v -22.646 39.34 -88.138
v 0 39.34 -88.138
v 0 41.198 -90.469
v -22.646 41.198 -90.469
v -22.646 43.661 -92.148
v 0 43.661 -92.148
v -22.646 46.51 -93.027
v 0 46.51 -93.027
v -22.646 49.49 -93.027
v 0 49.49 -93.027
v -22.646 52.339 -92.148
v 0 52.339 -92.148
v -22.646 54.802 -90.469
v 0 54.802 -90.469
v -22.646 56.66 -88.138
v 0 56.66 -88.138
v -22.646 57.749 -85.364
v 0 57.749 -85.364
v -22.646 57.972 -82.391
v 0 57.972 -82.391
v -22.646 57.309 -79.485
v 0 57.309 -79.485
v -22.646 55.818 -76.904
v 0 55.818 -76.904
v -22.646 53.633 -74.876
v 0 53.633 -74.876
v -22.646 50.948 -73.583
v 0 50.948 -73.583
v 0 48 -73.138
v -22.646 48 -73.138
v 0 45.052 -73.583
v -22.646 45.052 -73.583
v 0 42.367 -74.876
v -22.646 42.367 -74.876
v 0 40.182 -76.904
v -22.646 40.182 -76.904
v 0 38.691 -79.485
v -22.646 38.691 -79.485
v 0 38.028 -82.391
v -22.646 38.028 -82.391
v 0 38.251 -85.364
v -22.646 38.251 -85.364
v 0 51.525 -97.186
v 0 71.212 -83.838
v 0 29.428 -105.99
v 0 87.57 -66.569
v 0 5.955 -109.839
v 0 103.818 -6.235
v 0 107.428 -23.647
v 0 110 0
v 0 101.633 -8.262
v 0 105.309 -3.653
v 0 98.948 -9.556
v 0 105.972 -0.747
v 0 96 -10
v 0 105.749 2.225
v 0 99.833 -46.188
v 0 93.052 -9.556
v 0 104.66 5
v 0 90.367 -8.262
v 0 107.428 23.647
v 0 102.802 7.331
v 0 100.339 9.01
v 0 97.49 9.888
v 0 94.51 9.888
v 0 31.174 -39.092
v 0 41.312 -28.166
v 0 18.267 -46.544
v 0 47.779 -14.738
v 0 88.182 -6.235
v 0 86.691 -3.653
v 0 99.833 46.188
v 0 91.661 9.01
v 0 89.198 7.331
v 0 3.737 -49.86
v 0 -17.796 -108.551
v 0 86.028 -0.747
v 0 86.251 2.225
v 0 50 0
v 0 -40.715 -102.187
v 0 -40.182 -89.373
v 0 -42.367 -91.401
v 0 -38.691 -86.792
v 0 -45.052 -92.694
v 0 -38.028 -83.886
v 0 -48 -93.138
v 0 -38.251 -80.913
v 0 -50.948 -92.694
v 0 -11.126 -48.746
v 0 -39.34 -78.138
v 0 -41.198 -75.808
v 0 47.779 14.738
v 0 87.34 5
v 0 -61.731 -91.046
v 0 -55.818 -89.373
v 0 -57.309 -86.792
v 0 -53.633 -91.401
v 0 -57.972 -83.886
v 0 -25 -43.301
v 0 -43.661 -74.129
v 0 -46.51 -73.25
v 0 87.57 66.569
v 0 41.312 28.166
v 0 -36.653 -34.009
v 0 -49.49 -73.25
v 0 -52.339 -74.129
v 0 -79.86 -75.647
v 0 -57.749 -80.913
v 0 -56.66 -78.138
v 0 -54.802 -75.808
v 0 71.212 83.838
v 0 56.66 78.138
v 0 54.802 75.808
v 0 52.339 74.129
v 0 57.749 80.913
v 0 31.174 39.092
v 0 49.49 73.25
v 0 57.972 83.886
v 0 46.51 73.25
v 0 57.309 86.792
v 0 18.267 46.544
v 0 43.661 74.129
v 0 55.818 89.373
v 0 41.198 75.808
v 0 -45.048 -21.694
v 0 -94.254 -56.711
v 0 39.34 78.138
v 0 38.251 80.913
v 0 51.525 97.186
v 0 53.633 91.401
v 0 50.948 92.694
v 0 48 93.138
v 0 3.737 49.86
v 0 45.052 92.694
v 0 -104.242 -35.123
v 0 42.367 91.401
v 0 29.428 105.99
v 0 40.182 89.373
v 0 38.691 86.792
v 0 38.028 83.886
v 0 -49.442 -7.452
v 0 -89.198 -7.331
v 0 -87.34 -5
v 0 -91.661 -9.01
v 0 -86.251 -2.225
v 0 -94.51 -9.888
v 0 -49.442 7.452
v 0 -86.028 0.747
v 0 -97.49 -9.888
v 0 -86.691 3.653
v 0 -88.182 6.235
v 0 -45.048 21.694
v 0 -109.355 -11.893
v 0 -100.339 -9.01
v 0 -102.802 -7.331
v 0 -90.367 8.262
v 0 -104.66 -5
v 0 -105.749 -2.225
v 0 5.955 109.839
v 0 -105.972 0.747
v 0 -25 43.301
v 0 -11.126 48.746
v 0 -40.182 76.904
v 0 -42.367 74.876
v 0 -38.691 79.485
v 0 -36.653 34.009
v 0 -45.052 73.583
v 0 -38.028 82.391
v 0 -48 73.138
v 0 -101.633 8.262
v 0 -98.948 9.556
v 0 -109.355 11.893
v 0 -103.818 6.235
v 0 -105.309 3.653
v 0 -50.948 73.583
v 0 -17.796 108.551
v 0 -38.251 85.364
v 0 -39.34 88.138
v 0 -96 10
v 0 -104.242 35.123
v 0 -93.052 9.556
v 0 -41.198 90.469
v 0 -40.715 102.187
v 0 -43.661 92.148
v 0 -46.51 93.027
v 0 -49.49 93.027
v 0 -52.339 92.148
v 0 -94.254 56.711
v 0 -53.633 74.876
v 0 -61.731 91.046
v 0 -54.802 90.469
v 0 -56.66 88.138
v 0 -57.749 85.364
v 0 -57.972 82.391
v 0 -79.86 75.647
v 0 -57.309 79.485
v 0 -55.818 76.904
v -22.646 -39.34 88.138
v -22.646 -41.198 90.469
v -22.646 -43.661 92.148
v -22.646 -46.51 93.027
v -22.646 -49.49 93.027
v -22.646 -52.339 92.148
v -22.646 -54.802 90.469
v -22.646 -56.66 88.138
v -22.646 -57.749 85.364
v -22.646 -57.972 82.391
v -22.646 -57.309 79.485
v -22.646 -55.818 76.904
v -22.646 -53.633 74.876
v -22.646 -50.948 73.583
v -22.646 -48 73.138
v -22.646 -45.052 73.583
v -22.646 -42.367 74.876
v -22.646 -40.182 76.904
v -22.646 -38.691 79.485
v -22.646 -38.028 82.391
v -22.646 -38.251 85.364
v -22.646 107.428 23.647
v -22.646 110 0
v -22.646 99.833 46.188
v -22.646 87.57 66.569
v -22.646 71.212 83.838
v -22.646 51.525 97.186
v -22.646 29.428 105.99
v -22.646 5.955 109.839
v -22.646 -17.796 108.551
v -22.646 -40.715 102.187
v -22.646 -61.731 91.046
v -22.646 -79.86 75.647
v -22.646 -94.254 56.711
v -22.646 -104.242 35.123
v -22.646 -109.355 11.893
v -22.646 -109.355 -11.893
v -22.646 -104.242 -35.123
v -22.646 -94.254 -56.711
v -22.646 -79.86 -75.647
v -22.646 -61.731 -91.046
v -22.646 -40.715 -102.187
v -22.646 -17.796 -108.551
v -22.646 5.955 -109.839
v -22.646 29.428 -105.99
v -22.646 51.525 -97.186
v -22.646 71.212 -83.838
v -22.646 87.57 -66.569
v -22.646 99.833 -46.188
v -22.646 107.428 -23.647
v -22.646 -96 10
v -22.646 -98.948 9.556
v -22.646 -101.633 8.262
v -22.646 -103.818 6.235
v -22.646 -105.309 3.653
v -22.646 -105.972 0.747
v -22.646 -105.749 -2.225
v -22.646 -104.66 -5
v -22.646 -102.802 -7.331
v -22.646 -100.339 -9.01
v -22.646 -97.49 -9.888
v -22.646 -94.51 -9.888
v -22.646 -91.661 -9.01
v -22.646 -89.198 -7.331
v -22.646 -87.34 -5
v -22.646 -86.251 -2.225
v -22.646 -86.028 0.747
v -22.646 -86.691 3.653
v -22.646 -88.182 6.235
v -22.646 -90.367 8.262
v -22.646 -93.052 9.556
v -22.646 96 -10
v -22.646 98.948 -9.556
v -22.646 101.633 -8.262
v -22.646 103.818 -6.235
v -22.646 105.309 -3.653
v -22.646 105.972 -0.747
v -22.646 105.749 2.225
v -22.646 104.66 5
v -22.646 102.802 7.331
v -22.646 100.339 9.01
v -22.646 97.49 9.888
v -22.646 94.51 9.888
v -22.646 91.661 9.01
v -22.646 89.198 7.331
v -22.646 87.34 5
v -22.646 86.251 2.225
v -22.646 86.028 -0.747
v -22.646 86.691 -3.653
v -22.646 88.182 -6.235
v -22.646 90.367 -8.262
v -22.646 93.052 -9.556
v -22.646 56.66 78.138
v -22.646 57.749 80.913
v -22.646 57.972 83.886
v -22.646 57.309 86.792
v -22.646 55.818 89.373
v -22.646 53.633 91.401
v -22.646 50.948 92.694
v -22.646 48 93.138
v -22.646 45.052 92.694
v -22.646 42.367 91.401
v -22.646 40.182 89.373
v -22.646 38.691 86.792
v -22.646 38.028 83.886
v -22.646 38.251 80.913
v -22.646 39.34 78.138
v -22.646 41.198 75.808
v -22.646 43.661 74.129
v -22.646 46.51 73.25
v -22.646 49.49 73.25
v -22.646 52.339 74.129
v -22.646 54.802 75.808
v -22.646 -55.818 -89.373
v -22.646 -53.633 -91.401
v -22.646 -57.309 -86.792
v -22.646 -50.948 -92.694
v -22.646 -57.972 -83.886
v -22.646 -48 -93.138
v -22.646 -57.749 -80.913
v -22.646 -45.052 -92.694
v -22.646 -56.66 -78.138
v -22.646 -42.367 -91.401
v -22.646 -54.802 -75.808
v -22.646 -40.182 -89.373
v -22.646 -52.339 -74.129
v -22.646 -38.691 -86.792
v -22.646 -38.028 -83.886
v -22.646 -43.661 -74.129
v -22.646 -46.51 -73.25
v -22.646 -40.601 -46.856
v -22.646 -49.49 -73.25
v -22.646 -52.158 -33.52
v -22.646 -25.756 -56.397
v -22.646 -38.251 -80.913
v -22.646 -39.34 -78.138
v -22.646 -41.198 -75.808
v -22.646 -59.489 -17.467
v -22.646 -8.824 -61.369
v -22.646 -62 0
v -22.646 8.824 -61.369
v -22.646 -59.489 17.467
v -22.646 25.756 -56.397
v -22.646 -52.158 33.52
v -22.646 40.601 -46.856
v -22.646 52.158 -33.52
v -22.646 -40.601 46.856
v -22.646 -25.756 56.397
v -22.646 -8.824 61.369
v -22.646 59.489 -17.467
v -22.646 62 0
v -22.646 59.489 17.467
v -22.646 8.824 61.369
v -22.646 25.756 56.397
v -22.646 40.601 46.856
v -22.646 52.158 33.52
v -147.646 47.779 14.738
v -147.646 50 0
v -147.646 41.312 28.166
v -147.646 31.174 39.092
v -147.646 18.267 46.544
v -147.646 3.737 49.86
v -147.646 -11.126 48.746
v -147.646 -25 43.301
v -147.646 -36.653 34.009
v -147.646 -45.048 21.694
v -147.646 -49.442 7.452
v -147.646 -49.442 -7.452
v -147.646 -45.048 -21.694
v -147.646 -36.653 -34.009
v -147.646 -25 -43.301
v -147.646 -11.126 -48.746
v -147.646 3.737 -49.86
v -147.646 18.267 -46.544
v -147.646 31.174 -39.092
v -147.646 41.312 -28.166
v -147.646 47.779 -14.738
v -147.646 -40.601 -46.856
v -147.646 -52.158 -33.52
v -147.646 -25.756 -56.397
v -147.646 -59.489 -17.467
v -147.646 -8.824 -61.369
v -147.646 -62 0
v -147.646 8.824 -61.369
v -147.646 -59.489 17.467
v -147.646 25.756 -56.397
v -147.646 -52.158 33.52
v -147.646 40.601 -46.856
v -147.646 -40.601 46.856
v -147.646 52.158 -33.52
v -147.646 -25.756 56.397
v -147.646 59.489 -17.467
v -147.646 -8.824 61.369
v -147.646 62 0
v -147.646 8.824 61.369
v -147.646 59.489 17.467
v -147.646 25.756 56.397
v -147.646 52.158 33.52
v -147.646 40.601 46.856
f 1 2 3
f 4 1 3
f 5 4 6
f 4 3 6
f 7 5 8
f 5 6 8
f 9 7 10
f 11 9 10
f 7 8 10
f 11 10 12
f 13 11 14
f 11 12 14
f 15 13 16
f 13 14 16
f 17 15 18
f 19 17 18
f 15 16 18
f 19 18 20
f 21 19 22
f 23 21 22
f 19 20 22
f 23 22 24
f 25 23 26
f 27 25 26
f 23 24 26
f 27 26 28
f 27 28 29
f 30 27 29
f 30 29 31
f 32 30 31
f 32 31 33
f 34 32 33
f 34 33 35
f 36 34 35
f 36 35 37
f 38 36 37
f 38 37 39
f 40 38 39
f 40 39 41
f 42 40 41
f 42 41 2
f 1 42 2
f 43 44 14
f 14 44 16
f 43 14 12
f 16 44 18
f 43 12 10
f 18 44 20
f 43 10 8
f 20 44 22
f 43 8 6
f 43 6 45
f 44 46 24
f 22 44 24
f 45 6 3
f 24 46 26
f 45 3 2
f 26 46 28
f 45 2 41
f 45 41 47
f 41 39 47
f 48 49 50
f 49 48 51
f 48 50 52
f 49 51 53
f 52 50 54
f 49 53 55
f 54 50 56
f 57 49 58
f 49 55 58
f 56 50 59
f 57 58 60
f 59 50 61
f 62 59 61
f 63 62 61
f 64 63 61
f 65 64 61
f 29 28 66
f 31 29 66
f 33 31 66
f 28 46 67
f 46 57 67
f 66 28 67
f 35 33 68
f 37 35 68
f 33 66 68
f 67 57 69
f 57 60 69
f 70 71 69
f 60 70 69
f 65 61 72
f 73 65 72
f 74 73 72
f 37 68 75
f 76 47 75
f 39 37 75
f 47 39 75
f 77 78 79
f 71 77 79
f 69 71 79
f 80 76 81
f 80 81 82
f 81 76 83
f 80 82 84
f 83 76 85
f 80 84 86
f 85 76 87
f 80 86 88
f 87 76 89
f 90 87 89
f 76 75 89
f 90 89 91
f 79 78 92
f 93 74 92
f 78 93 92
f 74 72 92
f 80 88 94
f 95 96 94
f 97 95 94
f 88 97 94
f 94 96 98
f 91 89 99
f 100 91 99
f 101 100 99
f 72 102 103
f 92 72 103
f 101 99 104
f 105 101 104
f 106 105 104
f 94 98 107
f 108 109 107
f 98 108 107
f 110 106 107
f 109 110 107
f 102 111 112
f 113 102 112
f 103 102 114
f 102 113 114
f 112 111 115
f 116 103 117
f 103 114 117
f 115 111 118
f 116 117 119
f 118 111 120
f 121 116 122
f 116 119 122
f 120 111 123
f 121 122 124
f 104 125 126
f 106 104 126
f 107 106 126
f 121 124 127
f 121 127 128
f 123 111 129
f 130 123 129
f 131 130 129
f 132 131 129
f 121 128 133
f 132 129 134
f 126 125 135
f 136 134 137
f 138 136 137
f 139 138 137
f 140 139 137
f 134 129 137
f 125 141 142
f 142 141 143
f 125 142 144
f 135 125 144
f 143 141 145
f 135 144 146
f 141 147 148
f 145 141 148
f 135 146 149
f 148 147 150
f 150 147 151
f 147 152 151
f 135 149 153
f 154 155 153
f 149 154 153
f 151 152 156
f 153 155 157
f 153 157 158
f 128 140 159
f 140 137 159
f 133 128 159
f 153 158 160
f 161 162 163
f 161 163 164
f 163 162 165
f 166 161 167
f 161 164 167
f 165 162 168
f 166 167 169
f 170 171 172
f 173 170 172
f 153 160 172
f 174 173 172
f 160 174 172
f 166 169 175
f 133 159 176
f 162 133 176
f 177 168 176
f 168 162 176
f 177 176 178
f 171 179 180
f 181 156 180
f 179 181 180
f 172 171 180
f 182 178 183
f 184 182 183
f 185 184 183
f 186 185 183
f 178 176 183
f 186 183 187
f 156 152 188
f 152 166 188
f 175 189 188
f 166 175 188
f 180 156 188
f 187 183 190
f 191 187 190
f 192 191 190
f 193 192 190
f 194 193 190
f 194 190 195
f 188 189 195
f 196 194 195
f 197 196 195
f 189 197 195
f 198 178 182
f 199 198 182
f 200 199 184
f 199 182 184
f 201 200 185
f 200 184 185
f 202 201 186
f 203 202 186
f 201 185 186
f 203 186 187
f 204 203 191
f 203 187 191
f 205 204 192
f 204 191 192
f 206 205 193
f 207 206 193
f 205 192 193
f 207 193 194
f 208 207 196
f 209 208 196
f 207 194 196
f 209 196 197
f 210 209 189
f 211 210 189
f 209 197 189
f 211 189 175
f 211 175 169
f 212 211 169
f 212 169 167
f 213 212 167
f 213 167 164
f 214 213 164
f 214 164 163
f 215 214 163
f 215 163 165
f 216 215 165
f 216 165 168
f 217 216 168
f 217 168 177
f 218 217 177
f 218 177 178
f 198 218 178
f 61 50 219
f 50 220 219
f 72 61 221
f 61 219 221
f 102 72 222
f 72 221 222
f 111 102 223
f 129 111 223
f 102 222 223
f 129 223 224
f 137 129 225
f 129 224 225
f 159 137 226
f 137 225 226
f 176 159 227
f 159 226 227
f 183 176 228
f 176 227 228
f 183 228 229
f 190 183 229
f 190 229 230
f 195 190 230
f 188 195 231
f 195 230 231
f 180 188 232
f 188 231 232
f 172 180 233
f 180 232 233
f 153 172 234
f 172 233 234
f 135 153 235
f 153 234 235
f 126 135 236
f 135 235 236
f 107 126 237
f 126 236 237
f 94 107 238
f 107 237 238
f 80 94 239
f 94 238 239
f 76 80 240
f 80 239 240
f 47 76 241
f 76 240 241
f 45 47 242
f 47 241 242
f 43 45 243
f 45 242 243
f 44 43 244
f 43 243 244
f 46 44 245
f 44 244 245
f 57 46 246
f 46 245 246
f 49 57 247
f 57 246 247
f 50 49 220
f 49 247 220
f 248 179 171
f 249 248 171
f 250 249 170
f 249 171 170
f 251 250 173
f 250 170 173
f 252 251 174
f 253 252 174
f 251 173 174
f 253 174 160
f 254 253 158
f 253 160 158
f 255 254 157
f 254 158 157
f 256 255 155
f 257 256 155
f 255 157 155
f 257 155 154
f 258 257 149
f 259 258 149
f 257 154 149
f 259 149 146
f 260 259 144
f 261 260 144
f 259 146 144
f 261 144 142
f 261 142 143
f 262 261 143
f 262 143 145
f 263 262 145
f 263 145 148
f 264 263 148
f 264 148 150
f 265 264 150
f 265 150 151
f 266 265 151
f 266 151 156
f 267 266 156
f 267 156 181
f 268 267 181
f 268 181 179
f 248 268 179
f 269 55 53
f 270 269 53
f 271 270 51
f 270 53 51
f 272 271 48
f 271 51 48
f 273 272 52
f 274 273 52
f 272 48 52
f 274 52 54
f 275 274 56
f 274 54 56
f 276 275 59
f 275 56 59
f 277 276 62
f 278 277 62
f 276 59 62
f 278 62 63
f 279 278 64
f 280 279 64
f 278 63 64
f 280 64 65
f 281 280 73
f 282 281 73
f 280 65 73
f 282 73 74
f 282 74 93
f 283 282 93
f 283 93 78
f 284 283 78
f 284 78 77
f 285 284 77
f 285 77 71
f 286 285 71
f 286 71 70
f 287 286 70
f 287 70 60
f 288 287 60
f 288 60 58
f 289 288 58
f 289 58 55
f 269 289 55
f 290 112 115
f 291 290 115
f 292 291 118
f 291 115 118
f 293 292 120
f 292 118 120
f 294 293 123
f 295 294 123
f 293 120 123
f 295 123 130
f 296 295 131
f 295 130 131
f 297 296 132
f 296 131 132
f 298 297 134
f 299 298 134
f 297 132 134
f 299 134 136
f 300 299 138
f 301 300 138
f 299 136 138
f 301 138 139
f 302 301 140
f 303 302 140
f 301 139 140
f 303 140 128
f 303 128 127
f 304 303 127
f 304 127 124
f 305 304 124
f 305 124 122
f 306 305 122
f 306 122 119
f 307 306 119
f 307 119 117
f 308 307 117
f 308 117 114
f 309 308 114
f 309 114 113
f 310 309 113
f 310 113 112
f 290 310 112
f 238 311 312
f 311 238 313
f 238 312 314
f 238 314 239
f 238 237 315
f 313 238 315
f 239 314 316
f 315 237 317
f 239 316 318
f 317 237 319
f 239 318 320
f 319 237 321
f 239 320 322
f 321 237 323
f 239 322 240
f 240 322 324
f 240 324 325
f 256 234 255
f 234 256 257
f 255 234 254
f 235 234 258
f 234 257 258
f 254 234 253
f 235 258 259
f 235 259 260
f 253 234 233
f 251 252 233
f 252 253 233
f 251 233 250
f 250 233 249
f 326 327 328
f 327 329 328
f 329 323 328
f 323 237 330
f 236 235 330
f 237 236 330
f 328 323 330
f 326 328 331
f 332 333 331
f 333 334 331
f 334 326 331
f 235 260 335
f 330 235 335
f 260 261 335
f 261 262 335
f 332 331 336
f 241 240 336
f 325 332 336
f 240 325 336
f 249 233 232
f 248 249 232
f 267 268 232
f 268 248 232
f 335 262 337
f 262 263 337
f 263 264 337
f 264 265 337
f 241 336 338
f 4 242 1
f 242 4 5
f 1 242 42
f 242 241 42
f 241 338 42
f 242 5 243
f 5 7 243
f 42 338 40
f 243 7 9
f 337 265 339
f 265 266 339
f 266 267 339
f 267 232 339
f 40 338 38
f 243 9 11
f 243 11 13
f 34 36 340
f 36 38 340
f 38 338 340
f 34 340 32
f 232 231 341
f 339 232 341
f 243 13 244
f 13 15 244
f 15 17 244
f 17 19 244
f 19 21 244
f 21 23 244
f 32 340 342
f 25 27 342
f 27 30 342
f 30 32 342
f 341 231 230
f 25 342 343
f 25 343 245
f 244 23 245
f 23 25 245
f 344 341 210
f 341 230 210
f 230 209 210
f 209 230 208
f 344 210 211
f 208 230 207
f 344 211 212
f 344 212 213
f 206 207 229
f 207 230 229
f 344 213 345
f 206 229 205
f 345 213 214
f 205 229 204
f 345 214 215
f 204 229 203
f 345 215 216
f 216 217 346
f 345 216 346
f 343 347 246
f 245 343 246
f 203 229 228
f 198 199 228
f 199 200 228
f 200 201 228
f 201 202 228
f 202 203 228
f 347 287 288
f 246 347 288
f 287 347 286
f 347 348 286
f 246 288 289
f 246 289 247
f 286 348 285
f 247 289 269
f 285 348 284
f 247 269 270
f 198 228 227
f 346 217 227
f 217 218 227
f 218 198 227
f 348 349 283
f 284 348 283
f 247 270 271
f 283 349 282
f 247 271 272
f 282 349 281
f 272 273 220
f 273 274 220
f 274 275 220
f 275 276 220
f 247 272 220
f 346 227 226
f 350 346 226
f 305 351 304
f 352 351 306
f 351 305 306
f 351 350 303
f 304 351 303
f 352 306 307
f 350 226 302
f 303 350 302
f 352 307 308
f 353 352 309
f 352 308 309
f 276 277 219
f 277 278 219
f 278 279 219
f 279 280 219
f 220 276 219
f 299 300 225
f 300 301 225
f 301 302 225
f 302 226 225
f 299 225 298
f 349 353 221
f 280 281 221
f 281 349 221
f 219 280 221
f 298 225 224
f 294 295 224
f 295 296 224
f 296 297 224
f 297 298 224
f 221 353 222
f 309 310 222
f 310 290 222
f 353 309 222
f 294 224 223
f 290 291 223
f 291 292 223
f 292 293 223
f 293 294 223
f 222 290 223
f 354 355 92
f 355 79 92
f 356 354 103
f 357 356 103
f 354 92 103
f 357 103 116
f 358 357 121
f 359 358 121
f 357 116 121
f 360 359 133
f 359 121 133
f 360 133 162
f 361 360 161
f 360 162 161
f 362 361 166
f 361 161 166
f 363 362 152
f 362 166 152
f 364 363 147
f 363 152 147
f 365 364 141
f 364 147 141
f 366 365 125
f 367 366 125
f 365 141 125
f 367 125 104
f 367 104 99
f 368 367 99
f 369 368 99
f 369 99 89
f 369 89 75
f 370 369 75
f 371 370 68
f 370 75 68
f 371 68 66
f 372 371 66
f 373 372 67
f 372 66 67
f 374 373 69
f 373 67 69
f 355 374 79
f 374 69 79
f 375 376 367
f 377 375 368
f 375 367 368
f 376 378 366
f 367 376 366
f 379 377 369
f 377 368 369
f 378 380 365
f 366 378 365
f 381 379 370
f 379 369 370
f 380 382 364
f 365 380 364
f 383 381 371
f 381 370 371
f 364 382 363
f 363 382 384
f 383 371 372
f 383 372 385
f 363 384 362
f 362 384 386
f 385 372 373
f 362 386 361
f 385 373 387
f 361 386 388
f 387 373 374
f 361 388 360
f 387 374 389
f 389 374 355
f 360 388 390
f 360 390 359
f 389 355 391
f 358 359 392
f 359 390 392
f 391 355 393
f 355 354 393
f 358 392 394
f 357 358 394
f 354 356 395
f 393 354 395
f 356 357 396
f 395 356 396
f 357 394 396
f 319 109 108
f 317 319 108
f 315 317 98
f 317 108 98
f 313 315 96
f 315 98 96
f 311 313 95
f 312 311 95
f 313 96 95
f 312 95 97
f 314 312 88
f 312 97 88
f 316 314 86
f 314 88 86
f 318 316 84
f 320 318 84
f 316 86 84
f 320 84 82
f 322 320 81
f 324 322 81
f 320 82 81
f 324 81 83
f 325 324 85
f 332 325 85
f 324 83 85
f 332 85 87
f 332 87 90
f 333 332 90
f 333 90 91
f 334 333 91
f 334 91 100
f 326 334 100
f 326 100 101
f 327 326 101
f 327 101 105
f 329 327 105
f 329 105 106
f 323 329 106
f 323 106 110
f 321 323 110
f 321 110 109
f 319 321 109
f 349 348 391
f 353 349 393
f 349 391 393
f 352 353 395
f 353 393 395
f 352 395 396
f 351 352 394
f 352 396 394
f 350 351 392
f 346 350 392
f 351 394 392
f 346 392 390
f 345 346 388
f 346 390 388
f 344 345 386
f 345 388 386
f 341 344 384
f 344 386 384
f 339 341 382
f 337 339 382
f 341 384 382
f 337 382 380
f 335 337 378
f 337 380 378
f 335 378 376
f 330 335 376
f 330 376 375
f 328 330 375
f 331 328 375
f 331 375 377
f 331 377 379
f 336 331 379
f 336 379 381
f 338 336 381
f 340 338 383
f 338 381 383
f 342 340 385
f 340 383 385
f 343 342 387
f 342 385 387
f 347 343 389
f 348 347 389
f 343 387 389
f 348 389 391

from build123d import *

# Parameters (mm, degrees)
SKETCH2_R          = 10
CUT_EXTRUDE1_DEPTH = 30
CIRPATTERN1_COUNT  = 6


with BuildPart() as part:
    # Sketch1 → Revolve1 (revolve)
    with BuildSketch(Plane.XY):
        Polygon((-147.64573991, 50), (0, 50), (0, 110), (-22.64573991, 110), (-22.64573991, 62), (-147.64573991, 62), align=None)
    revolve(axis=Axis((-203.3632287, 0, 0), (1, 0, 0)))

    # Sketch2 → Cut-Extrude1 (cut)
    with BuildSketch(Plane(origin=(0, 0, 0), x_dir=(0, 0, -1), z_dir=(1, 0, 0))):
        with Locations((0, 96)):
            Circle(SKETCH2_R)
    cut_extrude1 = extrude(amount=-CUT_EXTRUDE1_DEPTH, mode=Mode.SUBTRACT)

    # CirPattern1: Cut-Extrude1 ×6 about axis
    cirpattern1_axis = Axis((0, 0, 0), (1, 0, 0))
    for i in range(1, CIRPATTERN1_COUNT):
        add(cut_extrude1.rotate(cirpattern1_axis, i * 360 / CIRPATTERN1_COUNT), mode=Mode.SUBTRACT)


solid = part.part
